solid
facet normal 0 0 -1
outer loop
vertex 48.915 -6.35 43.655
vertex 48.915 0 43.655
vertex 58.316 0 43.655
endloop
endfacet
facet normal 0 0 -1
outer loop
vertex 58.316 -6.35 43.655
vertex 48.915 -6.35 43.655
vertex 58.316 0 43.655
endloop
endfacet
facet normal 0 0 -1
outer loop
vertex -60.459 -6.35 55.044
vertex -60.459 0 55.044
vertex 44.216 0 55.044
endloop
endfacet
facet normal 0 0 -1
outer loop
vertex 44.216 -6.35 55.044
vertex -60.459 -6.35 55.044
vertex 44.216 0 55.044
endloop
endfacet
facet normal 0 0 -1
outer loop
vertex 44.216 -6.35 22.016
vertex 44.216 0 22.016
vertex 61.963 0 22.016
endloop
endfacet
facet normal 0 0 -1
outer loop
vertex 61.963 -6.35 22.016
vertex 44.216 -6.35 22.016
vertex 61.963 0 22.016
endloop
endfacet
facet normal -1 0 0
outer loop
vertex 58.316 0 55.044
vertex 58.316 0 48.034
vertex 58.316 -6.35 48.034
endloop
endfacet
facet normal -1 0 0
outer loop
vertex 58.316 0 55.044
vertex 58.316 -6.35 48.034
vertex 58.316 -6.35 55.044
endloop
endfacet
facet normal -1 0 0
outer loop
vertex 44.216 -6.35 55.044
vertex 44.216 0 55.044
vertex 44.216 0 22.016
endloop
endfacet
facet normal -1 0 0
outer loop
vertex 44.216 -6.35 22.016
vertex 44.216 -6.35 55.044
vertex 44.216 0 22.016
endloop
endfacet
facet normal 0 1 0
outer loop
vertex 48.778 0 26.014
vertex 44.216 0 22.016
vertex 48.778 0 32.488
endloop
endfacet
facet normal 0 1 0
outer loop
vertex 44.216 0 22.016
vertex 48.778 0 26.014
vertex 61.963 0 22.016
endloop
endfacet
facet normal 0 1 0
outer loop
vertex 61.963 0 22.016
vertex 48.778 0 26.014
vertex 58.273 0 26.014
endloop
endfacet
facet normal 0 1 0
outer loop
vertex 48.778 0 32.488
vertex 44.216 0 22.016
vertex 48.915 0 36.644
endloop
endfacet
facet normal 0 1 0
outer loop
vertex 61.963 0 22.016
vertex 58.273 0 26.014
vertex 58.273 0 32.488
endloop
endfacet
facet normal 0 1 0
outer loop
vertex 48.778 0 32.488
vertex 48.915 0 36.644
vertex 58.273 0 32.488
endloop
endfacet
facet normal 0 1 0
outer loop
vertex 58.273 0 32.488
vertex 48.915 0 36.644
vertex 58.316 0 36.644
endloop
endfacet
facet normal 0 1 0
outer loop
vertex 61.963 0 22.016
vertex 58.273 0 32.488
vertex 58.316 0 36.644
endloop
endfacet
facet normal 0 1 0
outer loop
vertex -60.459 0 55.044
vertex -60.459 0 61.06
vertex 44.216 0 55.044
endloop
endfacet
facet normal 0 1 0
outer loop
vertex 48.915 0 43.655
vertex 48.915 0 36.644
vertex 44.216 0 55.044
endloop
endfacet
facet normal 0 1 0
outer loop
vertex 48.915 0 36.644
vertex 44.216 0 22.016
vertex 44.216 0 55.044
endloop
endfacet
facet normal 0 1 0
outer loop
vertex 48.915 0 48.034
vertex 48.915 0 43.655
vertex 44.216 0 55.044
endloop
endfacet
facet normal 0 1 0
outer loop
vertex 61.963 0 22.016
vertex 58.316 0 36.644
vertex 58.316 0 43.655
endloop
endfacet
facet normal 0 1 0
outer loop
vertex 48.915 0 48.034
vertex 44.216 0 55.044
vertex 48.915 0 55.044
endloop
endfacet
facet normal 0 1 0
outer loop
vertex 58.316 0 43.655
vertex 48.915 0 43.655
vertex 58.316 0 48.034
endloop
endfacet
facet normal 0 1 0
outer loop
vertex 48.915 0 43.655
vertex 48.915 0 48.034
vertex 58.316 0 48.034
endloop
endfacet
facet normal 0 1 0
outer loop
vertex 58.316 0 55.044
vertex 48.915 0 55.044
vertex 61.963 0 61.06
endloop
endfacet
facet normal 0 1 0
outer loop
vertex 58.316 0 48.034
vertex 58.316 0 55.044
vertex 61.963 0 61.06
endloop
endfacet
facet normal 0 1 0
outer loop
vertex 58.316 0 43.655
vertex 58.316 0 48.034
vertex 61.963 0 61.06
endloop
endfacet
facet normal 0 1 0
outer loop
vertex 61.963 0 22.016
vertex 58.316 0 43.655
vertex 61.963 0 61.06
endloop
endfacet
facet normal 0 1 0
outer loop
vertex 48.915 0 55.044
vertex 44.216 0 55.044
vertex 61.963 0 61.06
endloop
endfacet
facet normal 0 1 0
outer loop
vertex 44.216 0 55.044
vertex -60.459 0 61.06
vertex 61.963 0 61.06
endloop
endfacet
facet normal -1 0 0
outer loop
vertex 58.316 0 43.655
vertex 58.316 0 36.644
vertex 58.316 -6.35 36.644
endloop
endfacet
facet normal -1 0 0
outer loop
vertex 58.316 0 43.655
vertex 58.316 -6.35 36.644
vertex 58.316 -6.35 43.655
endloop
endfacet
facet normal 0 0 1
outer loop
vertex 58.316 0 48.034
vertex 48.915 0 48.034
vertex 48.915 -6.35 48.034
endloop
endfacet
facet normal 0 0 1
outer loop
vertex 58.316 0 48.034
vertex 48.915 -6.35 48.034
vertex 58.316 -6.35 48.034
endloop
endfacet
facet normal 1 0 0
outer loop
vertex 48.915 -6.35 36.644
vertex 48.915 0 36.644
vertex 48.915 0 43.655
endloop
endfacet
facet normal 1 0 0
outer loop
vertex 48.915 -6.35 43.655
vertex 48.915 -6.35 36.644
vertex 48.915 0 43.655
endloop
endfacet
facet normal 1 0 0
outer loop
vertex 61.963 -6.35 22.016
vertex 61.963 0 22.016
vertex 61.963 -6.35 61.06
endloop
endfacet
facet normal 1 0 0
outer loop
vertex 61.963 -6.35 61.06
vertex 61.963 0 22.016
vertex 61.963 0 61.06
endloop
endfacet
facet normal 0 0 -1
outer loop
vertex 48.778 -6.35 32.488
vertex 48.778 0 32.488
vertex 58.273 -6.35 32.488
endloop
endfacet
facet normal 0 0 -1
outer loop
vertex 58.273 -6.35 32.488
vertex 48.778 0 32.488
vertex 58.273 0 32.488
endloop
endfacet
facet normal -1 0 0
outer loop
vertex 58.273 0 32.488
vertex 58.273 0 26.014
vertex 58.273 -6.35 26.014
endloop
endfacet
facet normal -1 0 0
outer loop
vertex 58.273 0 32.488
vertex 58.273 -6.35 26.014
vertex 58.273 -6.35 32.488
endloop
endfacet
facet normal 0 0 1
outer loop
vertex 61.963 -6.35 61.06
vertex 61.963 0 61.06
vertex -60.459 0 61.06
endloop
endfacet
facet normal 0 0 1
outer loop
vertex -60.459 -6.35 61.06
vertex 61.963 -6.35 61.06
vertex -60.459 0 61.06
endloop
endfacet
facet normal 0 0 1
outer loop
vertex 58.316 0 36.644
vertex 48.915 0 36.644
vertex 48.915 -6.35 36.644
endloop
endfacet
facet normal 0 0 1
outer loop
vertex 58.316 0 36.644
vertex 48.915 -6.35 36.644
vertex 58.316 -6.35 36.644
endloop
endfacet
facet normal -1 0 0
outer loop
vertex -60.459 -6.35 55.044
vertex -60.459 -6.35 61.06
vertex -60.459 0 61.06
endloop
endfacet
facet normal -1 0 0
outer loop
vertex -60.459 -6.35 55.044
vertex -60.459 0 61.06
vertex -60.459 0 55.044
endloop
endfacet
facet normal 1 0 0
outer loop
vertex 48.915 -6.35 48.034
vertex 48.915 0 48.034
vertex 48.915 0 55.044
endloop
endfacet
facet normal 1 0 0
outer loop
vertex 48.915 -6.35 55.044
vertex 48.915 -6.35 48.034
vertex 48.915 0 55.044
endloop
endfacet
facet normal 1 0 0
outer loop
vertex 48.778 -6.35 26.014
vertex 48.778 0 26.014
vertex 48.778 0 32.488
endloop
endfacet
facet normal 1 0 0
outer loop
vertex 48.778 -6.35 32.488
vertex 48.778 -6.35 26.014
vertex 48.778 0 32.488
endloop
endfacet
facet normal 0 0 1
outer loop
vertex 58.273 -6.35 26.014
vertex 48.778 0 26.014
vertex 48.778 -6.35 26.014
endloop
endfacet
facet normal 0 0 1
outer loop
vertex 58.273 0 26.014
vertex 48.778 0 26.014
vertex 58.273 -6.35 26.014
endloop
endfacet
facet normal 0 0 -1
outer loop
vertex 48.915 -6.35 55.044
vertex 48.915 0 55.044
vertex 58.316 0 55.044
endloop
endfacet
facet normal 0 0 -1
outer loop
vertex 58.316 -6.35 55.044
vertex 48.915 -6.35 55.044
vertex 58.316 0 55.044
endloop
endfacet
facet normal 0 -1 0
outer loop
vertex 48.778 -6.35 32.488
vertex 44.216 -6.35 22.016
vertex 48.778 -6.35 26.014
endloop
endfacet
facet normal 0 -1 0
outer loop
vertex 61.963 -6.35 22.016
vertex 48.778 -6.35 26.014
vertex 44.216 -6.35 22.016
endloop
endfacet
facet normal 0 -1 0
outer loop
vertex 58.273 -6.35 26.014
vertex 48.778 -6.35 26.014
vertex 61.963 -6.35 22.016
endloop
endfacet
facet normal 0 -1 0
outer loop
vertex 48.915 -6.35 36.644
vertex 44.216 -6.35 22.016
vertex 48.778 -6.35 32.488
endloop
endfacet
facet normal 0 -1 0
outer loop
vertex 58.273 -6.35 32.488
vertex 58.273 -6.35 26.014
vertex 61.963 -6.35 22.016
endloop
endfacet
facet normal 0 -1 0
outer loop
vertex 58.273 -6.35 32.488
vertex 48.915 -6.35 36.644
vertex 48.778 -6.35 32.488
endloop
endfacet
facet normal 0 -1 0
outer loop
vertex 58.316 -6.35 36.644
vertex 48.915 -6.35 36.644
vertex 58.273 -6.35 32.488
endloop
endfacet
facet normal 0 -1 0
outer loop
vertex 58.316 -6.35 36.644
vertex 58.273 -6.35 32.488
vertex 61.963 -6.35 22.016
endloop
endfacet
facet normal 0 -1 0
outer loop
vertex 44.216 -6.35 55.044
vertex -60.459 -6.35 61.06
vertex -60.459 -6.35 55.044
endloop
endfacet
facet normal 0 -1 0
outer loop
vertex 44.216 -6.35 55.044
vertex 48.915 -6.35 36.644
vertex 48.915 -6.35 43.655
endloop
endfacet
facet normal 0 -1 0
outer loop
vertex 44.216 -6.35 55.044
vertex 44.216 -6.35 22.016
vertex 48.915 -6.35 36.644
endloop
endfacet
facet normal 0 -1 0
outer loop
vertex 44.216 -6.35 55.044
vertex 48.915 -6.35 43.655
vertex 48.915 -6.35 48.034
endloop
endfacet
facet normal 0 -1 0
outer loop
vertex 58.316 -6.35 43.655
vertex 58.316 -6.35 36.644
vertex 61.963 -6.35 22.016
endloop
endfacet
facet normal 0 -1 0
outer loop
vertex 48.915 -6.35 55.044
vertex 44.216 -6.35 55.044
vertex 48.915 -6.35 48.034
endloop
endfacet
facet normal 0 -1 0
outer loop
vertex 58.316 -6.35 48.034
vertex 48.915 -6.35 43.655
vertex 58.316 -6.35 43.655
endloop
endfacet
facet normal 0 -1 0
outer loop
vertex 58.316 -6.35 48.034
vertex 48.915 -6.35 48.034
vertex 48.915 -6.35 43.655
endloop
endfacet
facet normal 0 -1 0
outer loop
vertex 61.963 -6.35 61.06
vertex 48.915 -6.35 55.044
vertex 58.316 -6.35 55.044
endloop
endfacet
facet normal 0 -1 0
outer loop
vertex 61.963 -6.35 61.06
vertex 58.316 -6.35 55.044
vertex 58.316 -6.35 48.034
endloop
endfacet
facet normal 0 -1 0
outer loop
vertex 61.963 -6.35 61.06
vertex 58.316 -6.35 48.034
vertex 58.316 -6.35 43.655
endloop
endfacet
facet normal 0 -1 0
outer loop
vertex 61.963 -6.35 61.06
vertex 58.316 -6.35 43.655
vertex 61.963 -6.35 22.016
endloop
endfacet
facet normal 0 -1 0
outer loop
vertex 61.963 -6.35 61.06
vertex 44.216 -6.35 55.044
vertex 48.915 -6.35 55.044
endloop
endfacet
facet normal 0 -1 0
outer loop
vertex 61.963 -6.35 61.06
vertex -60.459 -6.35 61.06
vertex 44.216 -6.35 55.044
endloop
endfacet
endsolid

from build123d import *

# Parameters (mm, degrees)
F1_W     = 9.495668
F1_H     = 6.474912
F1_W_2   = 9.400923
F1_H_2   = 7.010855
F0_DEPTH = 6.35


with BuildPart() as f0:
    # F1 (on Front) → F0 (new body)
    with BuildSketch(Plane.XZ):
        Polygon((61.962634, 61.060265), (-60.458682, 61.060265), (-60.458682, 55.044476), (44.216055, 55.044476), (44.216055, 22.015698), (61.962634, 22.015698), align=None)
        with Locations((53.525379, 29.250968)):
            Rectangle(F1_W, F1_H, mode=Mode.SUBTRACT)
        with Locations((53.615397, 40.149778)):
            Rectangle(F1_W_2, F1_H_2, mode=Mode.SUBTRACT)
        with Locations((53.615397, 51.539048)):
            Rectangle(F1_W_2, F1_H_2, mode=Mode.SUBTRACT)
    extrude(amount=F0_DEPTH)


solid = f0.part
